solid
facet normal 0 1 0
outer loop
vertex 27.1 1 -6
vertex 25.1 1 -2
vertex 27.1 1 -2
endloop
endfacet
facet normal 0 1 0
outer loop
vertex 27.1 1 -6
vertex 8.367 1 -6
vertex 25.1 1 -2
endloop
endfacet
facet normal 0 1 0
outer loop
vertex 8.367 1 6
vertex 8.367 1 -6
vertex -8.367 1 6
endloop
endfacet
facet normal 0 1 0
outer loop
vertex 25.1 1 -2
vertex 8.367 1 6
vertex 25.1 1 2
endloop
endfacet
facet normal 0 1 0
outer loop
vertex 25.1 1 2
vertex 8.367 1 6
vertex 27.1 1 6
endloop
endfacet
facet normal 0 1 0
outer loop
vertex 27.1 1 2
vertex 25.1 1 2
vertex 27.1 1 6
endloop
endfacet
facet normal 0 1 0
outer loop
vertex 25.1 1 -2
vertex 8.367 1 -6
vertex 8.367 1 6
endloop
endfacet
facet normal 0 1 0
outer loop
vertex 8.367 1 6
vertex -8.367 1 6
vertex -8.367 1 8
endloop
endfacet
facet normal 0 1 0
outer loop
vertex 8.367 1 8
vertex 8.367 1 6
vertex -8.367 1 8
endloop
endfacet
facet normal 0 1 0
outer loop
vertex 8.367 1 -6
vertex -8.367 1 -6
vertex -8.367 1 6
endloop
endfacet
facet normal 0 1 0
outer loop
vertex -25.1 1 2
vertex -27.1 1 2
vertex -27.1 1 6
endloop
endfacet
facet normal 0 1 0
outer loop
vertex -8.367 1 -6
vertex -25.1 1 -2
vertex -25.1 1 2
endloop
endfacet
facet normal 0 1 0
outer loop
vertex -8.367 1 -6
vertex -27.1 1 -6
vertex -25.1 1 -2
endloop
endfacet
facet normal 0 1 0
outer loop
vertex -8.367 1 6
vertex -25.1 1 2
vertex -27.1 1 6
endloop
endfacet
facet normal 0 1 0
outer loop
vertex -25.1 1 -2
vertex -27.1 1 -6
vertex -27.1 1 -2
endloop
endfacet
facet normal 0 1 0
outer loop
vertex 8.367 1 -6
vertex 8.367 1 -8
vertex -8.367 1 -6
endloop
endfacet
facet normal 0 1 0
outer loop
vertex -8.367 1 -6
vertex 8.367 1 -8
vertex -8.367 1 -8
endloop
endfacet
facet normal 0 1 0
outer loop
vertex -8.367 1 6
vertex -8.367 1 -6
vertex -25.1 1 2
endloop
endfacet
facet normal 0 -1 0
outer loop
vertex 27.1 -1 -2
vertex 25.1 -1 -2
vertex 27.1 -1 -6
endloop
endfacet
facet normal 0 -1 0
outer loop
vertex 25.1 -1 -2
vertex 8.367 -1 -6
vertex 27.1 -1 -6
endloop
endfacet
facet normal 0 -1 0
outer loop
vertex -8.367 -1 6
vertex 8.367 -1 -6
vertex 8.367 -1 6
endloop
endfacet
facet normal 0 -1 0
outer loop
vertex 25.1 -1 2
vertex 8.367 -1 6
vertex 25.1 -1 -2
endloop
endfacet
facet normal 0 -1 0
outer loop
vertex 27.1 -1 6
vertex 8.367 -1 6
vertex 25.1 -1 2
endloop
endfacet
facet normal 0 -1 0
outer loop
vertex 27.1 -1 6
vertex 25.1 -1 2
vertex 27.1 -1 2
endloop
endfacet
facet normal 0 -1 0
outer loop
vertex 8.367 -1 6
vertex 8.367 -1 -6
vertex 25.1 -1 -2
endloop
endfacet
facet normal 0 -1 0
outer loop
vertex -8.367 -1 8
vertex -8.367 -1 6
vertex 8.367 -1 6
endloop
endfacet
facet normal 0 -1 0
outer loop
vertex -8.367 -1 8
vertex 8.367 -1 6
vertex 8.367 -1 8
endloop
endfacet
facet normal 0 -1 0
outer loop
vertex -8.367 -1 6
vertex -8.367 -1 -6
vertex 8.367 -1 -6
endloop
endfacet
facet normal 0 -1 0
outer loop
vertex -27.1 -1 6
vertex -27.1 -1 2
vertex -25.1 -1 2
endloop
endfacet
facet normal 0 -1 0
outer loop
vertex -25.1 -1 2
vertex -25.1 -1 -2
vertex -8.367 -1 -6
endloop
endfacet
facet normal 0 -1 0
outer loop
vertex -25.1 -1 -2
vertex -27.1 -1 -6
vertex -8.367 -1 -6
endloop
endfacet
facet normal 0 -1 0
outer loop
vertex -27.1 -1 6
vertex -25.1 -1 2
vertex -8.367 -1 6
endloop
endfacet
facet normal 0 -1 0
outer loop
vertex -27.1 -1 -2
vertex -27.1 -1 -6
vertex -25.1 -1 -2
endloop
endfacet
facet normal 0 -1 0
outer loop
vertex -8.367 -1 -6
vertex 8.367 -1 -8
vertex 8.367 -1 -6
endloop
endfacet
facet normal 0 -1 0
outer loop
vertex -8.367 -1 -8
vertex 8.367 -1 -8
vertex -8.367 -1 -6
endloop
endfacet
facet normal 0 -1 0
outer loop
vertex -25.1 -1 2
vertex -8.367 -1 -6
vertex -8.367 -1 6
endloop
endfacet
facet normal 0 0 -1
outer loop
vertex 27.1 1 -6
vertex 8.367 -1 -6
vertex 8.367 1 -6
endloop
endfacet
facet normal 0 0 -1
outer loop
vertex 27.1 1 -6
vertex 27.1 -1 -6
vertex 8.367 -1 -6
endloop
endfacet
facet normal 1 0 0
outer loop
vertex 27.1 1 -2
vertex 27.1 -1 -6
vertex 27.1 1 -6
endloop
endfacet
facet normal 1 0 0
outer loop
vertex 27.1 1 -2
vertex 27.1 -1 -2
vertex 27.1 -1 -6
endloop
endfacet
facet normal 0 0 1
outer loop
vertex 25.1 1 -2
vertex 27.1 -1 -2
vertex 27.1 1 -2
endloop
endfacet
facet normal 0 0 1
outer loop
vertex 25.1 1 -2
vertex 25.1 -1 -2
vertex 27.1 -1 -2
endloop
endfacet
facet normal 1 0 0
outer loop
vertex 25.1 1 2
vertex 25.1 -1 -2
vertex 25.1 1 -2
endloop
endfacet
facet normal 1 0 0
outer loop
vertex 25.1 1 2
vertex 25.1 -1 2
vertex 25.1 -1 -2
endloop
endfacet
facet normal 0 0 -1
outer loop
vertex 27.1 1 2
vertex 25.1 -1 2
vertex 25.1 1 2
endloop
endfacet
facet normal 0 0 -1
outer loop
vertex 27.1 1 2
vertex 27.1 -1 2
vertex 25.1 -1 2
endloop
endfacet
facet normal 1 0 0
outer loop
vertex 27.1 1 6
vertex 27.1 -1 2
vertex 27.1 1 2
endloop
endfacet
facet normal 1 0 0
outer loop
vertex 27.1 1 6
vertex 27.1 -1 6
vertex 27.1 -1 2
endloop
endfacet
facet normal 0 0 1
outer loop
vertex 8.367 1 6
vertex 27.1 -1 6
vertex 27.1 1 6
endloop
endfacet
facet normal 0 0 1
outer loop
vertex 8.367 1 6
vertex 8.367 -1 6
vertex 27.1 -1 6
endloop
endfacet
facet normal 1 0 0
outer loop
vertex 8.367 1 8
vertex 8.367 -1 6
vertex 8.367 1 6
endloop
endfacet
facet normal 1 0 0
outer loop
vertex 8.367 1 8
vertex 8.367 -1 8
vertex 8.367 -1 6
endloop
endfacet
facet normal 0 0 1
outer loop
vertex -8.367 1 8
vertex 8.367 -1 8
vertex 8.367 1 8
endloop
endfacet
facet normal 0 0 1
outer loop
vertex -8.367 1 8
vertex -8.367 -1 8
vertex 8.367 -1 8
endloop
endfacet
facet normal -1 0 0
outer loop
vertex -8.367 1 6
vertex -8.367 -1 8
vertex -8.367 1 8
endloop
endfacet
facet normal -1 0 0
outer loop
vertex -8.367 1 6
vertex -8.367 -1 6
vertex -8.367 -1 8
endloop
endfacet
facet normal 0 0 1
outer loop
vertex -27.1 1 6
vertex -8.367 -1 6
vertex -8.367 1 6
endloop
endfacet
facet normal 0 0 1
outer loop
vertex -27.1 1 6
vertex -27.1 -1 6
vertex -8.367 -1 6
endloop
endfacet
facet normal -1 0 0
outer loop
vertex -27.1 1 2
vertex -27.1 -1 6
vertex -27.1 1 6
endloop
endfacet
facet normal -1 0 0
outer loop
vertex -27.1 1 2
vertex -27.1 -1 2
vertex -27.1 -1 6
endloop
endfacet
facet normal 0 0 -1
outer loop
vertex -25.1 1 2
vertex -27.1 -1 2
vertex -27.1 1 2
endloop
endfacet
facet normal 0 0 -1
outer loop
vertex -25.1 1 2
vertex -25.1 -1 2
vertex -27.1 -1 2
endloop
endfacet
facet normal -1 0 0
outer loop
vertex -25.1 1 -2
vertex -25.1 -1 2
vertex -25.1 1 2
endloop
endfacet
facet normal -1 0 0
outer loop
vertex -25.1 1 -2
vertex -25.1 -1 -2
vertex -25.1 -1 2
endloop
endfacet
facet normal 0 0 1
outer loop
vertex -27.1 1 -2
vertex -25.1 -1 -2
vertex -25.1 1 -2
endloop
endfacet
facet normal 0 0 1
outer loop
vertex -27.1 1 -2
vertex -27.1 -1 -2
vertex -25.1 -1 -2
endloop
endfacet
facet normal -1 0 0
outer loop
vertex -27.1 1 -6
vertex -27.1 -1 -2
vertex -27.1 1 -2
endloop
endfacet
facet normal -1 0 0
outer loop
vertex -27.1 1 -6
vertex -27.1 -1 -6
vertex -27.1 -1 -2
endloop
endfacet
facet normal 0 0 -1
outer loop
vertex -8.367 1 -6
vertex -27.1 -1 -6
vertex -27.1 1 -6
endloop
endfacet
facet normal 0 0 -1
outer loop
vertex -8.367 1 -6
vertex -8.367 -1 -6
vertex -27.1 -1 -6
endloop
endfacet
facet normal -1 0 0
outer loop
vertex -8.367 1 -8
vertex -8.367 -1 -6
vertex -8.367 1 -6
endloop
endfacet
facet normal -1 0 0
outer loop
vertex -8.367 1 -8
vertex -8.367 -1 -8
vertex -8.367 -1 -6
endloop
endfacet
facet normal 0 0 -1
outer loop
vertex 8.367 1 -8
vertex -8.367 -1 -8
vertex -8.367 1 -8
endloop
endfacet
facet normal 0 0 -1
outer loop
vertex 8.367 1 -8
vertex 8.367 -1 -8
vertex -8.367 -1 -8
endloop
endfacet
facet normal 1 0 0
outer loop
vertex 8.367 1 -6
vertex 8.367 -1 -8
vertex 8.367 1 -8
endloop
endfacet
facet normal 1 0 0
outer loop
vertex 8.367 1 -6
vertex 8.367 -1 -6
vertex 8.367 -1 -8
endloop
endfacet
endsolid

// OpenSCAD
// file: ../lib/side.scad
module side_top_bottom(inner_x,inner_y,width) {
  x = inner_x/2;
  y = inner_y/2;

  polygon(points=[
      [-x-width,-y-width],
      [-x*1/3,-y-width],
      [-x*1/3,-y],
      [x*1/3,-y],
      [x*1/3,-y-width],
      [x+width,-y-width],
      [x+width,-y*1/3],
      [x,-y*1/3],
      [x,y*1/3],
      [x+width,y*1/3],
      [x+width,y+width],
      [x*1/3,y+width],
      [x*1/3,y],
      [-x*1/3,y],
      [-x*1/3,y+width],
      [-x-width,y+width],
      [-x-width,y*1/3],
      [-x,y*1/3],
      [-x,-y*1/3],
      [-x-width,-y*1/3],
    ],convexity=10);
}

module side_left_right(inner_x,inner_z,width) {
  x = inner_x/2;
  z = inner_z/2;

  polygon(points=[
      [-x-width,-z],
      [-x*1/3,-z],
      [-x*1/3,-z-width],
      [x*1/3,-z-width],
      [x*1/3,-z],
      [x+width,-z],
      [x+width,-z*1/3],
      [x,-z*1/3],
      [x,z*1/3],
      [x+width,z*1/3],
      [x+width,z],
      [x*1/3,z],
      [x*1/3,z+width],
      [-x*1/3,z+width],
      [-x*1/3,z],
      [-x-width,z],
      [-x-width,z*1/3],
      [-x,z*1/3],
      [-x,-z*1/3],
      [-x-width,-z*1/3],
    ],convexity=10);
}


module side_front_back(inner_y,inner_z,width) {
  y = inner_y/2;
  z = inner_z/2;

  polygon(points=[
      [-y,-z],
      [-y*1/3,-z],
      [-y*1/3,-z-width],
      [y*1/3,-z-width],
      [y*1/3,-z],
      [y,-z],
      [y,-z*1/3],
      [y+width,-z*1/3],
      [y+width,z*1/3],
      [y,z*1/3],
      [y,z],
      [y*1/3,z],
      [y*1/3,z+width],
      [-y*1/3,z+width],
      [-y*1/3,z],
      [-y,z],
      [-y,z*1/3],
      [-y-width,z*1/3],
      [-y-width,-z*1/3],
      [-y,-z*1/3],
    ],convexity=10);
}
// file: left.2d.scad
use <../lib/side.scad>

module left() {
  side_left_right(50.2,12,2);
}

left();
// main file
use <left.2d.scad>;

rotate([90,0,0]) {
  linear_extrude(height = 2, center = true, convexity = 10, twist = 0) {
    left();
  }
}
